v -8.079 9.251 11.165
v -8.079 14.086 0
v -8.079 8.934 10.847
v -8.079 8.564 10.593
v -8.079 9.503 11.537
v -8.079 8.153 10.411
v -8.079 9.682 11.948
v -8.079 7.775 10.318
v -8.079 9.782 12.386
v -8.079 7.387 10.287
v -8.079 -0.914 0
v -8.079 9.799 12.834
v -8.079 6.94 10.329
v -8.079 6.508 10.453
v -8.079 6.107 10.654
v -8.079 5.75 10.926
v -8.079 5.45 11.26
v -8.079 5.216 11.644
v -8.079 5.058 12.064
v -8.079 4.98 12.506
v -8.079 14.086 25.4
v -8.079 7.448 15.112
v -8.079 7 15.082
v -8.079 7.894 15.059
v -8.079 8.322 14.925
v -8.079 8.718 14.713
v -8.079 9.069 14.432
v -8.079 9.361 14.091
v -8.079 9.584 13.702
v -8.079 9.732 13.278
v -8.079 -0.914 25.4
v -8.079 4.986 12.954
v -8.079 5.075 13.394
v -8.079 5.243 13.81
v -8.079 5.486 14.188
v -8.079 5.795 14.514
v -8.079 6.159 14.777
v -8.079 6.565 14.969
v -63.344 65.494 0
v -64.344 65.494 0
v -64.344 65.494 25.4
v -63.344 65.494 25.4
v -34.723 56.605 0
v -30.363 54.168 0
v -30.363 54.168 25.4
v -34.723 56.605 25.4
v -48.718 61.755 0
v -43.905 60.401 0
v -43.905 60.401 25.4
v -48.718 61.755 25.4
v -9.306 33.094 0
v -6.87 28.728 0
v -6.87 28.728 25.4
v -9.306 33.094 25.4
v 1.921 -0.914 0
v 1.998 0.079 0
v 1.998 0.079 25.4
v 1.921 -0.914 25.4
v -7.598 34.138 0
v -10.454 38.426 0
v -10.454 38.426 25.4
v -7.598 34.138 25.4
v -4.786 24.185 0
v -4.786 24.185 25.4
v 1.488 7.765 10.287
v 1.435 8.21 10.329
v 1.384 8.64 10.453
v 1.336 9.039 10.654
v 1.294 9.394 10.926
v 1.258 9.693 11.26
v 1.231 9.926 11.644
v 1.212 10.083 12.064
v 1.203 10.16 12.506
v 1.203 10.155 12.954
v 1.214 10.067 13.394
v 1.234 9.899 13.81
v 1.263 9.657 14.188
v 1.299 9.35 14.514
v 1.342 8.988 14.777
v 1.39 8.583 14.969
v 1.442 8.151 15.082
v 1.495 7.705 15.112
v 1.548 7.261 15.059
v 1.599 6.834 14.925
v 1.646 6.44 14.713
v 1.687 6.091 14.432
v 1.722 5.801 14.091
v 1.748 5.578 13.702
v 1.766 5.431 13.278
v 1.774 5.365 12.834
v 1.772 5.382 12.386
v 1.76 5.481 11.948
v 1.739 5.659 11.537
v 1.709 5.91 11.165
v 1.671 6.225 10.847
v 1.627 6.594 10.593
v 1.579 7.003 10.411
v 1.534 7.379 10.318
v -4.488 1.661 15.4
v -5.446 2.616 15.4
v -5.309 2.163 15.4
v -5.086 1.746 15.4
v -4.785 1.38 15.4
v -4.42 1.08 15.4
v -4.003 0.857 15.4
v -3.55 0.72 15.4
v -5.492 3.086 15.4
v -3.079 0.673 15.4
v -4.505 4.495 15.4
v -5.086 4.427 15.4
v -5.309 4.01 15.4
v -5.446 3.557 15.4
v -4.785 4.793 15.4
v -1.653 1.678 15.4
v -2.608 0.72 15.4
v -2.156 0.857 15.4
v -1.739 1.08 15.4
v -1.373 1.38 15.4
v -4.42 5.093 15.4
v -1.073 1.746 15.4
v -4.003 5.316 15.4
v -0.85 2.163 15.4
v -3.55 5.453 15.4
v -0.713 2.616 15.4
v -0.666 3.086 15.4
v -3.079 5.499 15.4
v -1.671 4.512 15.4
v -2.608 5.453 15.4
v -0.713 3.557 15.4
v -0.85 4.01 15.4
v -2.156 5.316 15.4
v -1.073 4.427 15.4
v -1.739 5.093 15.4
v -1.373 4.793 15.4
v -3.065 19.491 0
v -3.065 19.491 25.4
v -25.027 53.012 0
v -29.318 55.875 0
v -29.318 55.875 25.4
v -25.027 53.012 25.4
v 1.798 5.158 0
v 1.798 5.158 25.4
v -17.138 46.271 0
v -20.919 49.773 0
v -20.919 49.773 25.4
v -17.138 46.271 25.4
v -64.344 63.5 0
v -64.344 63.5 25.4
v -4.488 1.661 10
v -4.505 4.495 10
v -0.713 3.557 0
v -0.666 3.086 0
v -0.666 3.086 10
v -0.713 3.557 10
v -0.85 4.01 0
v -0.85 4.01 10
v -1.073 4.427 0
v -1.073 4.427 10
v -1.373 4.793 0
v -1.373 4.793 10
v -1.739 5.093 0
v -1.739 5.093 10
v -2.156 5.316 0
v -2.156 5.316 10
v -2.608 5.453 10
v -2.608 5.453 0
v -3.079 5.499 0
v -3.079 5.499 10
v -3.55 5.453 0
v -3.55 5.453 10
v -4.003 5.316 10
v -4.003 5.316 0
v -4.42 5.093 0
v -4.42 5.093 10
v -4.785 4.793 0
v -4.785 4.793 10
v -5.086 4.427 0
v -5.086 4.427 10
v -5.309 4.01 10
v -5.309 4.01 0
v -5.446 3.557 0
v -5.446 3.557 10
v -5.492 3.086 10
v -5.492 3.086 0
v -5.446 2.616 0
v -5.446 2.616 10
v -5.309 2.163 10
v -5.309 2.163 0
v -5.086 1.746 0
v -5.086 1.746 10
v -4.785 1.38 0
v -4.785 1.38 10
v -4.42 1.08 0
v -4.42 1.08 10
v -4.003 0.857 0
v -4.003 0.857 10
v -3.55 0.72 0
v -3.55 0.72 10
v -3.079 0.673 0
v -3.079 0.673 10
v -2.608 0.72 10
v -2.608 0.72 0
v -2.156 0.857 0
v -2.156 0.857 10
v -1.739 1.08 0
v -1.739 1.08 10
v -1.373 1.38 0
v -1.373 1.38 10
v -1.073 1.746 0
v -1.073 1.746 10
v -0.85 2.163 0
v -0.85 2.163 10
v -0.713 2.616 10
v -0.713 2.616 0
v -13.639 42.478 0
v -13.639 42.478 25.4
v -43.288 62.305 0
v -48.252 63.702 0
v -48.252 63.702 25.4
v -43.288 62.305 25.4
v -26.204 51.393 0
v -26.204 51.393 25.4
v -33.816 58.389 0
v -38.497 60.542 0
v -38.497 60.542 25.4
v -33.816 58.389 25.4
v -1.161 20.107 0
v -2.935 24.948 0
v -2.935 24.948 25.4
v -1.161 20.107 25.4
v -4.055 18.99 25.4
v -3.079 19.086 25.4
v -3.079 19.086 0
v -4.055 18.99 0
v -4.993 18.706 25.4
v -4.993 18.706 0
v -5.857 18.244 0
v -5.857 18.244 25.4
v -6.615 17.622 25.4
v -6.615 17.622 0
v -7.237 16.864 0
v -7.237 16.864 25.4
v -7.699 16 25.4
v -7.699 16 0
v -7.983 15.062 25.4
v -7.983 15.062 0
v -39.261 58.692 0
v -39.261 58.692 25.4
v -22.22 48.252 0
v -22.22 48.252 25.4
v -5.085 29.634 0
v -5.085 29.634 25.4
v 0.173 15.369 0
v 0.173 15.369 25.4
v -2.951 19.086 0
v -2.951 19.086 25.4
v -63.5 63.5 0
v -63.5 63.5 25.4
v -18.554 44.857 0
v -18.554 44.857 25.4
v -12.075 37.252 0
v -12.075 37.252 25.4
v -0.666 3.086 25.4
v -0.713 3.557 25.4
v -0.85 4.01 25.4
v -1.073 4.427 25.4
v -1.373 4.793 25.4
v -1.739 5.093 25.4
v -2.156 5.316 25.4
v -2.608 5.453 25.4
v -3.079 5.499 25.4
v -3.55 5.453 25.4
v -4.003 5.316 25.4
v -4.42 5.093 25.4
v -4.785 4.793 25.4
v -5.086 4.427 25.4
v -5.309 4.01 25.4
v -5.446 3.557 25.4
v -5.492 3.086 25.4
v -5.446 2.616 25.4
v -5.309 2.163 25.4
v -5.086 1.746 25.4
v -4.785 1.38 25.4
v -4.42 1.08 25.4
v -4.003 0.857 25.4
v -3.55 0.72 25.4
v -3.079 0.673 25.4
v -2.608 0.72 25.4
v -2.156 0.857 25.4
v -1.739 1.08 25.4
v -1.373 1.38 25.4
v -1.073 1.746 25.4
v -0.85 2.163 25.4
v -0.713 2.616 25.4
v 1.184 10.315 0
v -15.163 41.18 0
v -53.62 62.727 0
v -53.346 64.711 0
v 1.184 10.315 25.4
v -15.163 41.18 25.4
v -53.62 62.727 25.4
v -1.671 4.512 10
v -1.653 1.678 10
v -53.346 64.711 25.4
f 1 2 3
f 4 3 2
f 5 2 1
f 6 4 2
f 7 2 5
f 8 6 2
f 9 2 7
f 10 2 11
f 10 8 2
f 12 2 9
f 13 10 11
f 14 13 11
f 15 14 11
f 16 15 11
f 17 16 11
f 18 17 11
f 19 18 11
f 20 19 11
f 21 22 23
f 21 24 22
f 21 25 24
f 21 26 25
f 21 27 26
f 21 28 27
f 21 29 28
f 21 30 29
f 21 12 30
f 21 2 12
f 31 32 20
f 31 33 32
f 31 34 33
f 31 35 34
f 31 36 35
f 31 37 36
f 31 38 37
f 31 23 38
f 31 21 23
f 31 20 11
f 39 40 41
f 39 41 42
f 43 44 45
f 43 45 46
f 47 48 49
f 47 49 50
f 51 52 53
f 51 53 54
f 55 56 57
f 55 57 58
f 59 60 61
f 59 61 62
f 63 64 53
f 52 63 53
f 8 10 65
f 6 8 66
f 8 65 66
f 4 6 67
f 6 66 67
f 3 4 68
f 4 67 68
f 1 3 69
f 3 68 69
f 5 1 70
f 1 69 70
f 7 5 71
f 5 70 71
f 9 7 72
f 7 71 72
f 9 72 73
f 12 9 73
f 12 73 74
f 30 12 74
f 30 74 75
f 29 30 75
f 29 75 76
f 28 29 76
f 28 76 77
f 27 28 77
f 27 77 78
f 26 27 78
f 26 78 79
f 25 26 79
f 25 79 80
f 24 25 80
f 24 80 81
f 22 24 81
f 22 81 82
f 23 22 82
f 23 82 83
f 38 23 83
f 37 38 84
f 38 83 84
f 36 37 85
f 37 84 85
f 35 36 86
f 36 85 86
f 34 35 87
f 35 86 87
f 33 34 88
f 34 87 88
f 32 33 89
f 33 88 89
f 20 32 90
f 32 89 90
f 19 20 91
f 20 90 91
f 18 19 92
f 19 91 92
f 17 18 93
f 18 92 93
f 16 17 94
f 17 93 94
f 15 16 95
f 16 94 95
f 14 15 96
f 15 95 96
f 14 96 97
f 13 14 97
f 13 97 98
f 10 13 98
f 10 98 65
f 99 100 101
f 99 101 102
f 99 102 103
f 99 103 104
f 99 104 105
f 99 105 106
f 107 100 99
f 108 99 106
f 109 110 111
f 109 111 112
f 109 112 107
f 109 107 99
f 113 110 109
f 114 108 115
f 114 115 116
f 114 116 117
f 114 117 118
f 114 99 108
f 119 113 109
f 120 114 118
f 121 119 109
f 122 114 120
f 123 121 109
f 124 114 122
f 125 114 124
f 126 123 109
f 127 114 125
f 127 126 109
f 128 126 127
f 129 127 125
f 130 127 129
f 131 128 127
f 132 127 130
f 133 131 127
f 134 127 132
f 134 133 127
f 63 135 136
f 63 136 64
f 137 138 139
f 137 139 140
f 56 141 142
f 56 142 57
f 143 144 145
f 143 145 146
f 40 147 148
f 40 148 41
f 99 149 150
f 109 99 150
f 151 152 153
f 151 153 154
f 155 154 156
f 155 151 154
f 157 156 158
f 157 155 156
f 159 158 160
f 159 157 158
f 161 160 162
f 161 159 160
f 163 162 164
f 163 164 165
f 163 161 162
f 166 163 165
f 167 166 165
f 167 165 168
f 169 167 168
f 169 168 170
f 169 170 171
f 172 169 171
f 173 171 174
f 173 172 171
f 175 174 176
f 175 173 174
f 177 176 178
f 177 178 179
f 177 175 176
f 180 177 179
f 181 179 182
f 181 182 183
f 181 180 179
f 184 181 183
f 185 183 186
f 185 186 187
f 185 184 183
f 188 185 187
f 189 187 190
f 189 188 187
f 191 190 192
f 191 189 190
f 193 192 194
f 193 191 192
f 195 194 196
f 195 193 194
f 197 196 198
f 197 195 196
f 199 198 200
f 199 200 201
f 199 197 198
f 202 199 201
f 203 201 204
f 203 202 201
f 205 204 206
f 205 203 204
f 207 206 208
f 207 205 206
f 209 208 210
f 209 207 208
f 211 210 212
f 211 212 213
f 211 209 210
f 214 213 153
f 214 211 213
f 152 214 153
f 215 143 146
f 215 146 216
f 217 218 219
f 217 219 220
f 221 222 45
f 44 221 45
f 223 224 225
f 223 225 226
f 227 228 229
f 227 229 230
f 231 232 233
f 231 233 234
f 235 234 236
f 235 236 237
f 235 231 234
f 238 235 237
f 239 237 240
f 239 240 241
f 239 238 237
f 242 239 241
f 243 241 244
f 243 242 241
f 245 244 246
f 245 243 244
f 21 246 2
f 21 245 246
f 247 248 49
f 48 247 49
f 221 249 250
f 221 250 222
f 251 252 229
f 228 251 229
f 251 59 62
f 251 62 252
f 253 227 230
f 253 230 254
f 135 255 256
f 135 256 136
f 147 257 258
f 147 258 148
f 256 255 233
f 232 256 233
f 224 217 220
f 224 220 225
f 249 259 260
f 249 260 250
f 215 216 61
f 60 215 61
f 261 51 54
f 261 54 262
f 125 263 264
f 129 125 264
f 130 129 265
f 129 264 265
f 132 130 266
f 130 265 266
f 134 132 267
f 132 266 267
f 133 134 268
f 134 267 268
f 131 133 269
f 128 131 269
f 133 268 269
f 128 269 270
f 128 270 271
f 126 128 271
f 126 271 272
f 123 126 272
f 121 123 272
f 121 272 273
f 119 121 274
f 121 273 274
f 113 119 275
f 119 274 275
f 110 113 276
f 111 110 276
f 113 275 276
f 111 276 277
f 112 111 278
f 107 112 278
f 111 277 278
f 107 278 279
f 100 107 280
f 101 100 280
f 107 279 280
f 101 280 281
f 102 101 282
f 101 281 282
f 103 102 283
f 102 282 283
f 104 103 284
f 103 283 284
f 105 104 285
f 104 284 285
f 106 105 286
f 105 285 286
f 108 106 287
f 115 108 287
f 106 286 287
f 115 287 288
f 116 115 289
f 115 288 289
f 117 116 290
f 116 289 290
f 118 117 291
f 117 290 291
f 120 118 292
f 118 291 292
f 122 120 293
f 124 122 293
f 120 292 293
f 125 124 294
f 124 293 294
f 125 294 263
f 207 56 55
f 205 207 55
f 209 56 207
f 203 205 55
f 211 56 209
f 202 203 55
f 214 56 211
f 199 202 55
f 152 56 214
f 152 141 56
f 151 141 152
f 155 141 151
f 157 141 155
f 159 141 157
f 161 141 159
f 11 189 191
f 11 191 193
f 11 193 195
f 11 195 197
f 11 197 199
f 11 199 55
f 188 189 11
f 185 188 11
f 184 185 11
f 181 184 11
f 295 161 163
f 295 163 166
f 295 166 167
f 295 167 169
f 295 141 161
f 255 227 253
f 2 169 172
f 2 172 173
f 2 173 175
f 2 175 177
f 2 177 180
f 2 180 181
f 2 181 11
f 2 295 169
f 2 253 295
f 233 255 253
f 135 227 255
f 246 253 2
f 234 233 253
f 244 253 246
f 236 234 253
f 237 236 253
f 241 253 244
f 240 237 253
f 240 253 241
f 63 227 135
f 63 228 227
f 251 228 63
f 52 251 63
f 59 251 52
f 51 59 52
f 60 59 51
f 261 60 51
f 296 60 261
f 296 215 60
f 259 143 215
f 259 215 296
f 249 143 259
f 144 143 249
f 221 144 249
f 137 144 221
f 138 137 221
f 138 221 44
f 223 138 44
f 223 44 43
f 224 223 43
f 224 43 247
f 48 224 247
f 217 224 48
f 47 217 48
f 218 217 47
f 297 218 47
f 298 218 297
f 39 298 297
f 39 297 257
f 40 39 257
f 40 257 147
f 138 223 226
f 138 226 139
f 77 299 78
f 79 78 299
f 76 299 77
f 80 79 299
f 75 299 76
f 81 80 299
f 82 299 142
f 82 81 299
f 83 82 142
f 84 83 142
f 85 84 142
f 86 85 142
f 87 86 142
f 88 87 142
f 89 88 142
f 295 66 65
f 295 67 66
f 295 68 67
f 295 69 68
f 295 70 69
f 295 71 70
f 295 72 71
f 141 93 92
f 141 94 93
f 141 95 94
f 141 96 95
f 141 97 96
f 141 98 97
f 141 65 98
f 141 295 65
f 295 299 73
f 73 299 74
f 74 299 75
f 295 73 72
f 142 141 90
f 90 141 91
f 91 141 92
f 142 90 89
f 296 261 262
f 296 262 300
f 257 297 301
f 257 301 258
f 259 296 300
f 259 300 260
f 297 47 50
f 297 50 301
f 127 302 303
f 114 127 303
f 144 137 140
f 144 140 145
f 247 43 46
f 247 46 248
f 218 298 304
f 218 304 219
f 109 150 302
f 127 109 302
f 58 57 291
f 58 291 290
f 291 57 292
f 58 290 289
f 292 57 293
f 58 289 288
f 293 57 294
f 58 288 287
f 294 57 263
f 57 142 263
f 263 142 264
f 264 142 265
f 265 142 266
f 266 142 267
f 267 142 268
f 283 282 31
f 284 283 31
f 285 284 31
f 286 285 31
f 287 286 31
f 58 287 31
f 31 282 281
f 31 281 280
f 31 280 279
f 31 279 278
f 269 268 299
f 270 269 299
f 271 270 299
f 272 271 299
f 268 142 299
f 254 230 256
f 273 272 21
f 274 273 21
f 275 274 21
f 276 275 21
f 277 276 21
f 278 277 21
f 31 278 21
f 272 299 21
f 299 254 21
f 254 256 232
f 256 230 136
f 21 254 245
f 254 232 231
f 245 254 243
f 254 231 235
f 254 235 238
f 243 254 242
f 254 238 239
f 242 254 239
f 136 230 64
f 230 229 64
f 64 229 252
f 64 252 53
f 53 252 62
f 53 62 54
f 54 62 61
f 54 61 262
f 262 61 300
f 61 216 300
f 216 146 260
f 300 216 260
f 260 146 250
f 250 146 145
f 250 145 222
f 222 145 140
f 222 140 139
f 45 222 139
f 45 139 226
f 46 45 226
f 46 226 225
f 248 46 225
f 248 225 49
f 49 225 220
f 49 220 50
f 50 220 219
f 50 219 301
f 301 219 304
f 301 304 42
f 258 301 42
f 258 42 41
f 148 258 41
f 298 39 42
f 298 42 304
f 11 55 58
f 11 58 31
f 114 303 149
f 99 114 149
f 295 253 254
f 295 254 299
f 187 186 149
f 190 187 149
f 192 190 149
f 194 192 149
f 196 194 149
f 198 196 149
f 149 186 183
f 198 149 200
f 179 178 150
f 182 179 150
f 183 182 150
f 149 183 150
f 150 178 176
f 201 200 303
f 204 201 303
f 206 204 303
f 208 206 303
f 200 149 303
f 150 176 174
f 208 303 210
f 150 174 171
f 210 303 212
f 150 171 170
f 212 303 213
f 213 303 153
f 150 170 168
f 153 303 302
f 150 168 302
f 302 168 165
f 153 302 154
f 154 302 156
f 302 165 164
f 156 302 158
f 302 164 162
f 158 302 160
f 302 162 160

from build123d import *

# Parameters (mm, degrees)
BOSS_EXTRUDE1_DEPTH = 25.4
BOSS_EXTRUDE4_DEPTH = 25.4
SKETCH11_R          = 2.413
CUT_EXTRUDE5_DEPTH  = 10
SKETCH12_R          = 2.413
CUT_EXTRUDE6_DEPTH  = 67.32996137
CUT_EXTRUDE7_DEPTH  = 16.4


with BuildPart() as part:
    # Sketch2 → Boss-Extrude1 (new body)
    with BuildSketch(Plane.XY):
        Polygon((0, 0), (-0.197156462, 5), (-0.792344965, 10), (-1.773207125, 14.901444272), (-3.065228232, 19.490725009), (-4.786089298, 24.185257701), (-6.870037676, 28.727989265), (-9.305862968, 33.094493671), (-12.075009115, 37.252118227), (-15.162850216, 41.179727425), (-18.554323068, 44.856840338), (-22.220180921, 48.251699833), (-26.203519544, 51.392825818), (-30.362680664, 54.16796163), (-34.722984466, 56.605064941), (-39.261459458, 58.691934304), (-43.904843636, 60.400992103), (-48.717885048, 61.755478118), (-53.619641135, 62.726617227), (-63.5, 63.5), (-64.343927861, 63.5), (-64.343927861, 65.493901073), (-63.343927861, 65.493901073), (-53.346320006, 64.711340662), (-48.251922828, 63.702035375), (-43.287590163, 62.304972979), (-38.497110063, 60.541774617), (-33.81592061, 58.389282674), (-29.318144049, 55.875341756), (-25.027437614, 53.01243437), (-20.919464687, 49.773025992), (-17.137579866, 46.270716817), (-13.639271322, 42.477770187), (-10.454072963, 38.42632649), (-7.597619105, 34.137617236), (-5.085040747, 29.633523897), (-2.935391785, 24.947573759), (-1.160924955, 20.106803802), (0.172809103, 15.369357963), (1.184287688, 10.31492104), (1.798173514, 5.157850442), (1.998446984, 0.078801347), (1.920765751, -0.913615973), (0, -0.913615973), align=None)
    extrude(amount=BOSS_EXTRUDE1_DEPTH)

    # Sketch10 → Boss-Extrude4 (add, through all)
    with BuildSketch(Plane.XY.offset(25.4)):
        with BuildLine():
            Line((1.920765751, -0.913615973), (1.998446984, 0.078801347))
            Line((1.998446984, 0.078801347), (1.798173514, 5.157850442))
            Line((1.798173514, 5.157850442), (0.172809103, 15.369357963))
            Line((0.172809103, 15.369357963), (-0.873645975, 19.086384027))
            Line((-0.873645975, 19.086384027), (-3.079234249, 19.086384027))
            ThreePointArc((-3.079234249, 19.086384027), (-6.614768155, 17.621917933), (-8.079234249, 14.086384027))
            Line((-8.079234249, 14.086384027), (-8.079234249, -0.913615973))
            Line((-8.079234249, -0.913615973), (1.920765751, -0.913615973))
        make_face()
    extrude(amount=-BOSS_EXTRUDE4_DEPTH)

    # Sketch11 → Cut-Extrude5 (cut)
    with BuildSketch(Plane.XY.offset(25.4)):
        with Locations((-3.079234249, 3.086384027)):
            Circle(SKETCH11_R)
    cut_extrude5 = extrude(amount=-CUT_EXTRUDE5_DEPTH, mode=Mode.SUBTRACT)

    # Sketch12 → Cut-Extrude6 (cut, through all)
    with BuildSketch(Plane(origin=(1.998446984, 0.078801347, 0), x_dir=(0, 0, -1), z_dir=(0.999223492, 0.039400674, 0))):
        with Locations((-12.7, 7.7)):
            Circle(SKETCH12_R)
    extrude(amount=-CUT_EXTRUDE6_DEPTH, mode=Mode.SUBTRACT)

    # Mirror3: Cut-Extrude5 across plane
    add(cut_extrude5.mirror(Plane(origin=(0, 0, 12.7), x_dir=(1, 0, 0), z_dir=(0, 0, -1))), mode=Mode.SUBTRACT)

    # Sketch15 → Cut-Extrude7 (cut, through all)
    with BuildSketch(Plane(origin=(0, 0, 10), x_dir=(-1, 0, 0), z_dir=(0, 0, -1))):
        Polygon((4.48781187, 1.660586836), (4.50503144, 4.494961648), (1.670656628, 4.512181219), (1.653437058, 1.677806407), align=None)
    extrude(amount=-CUT_EXTRUDE7_DEPTH, mode=Mode.SUBTRACT)


solid = part.part
